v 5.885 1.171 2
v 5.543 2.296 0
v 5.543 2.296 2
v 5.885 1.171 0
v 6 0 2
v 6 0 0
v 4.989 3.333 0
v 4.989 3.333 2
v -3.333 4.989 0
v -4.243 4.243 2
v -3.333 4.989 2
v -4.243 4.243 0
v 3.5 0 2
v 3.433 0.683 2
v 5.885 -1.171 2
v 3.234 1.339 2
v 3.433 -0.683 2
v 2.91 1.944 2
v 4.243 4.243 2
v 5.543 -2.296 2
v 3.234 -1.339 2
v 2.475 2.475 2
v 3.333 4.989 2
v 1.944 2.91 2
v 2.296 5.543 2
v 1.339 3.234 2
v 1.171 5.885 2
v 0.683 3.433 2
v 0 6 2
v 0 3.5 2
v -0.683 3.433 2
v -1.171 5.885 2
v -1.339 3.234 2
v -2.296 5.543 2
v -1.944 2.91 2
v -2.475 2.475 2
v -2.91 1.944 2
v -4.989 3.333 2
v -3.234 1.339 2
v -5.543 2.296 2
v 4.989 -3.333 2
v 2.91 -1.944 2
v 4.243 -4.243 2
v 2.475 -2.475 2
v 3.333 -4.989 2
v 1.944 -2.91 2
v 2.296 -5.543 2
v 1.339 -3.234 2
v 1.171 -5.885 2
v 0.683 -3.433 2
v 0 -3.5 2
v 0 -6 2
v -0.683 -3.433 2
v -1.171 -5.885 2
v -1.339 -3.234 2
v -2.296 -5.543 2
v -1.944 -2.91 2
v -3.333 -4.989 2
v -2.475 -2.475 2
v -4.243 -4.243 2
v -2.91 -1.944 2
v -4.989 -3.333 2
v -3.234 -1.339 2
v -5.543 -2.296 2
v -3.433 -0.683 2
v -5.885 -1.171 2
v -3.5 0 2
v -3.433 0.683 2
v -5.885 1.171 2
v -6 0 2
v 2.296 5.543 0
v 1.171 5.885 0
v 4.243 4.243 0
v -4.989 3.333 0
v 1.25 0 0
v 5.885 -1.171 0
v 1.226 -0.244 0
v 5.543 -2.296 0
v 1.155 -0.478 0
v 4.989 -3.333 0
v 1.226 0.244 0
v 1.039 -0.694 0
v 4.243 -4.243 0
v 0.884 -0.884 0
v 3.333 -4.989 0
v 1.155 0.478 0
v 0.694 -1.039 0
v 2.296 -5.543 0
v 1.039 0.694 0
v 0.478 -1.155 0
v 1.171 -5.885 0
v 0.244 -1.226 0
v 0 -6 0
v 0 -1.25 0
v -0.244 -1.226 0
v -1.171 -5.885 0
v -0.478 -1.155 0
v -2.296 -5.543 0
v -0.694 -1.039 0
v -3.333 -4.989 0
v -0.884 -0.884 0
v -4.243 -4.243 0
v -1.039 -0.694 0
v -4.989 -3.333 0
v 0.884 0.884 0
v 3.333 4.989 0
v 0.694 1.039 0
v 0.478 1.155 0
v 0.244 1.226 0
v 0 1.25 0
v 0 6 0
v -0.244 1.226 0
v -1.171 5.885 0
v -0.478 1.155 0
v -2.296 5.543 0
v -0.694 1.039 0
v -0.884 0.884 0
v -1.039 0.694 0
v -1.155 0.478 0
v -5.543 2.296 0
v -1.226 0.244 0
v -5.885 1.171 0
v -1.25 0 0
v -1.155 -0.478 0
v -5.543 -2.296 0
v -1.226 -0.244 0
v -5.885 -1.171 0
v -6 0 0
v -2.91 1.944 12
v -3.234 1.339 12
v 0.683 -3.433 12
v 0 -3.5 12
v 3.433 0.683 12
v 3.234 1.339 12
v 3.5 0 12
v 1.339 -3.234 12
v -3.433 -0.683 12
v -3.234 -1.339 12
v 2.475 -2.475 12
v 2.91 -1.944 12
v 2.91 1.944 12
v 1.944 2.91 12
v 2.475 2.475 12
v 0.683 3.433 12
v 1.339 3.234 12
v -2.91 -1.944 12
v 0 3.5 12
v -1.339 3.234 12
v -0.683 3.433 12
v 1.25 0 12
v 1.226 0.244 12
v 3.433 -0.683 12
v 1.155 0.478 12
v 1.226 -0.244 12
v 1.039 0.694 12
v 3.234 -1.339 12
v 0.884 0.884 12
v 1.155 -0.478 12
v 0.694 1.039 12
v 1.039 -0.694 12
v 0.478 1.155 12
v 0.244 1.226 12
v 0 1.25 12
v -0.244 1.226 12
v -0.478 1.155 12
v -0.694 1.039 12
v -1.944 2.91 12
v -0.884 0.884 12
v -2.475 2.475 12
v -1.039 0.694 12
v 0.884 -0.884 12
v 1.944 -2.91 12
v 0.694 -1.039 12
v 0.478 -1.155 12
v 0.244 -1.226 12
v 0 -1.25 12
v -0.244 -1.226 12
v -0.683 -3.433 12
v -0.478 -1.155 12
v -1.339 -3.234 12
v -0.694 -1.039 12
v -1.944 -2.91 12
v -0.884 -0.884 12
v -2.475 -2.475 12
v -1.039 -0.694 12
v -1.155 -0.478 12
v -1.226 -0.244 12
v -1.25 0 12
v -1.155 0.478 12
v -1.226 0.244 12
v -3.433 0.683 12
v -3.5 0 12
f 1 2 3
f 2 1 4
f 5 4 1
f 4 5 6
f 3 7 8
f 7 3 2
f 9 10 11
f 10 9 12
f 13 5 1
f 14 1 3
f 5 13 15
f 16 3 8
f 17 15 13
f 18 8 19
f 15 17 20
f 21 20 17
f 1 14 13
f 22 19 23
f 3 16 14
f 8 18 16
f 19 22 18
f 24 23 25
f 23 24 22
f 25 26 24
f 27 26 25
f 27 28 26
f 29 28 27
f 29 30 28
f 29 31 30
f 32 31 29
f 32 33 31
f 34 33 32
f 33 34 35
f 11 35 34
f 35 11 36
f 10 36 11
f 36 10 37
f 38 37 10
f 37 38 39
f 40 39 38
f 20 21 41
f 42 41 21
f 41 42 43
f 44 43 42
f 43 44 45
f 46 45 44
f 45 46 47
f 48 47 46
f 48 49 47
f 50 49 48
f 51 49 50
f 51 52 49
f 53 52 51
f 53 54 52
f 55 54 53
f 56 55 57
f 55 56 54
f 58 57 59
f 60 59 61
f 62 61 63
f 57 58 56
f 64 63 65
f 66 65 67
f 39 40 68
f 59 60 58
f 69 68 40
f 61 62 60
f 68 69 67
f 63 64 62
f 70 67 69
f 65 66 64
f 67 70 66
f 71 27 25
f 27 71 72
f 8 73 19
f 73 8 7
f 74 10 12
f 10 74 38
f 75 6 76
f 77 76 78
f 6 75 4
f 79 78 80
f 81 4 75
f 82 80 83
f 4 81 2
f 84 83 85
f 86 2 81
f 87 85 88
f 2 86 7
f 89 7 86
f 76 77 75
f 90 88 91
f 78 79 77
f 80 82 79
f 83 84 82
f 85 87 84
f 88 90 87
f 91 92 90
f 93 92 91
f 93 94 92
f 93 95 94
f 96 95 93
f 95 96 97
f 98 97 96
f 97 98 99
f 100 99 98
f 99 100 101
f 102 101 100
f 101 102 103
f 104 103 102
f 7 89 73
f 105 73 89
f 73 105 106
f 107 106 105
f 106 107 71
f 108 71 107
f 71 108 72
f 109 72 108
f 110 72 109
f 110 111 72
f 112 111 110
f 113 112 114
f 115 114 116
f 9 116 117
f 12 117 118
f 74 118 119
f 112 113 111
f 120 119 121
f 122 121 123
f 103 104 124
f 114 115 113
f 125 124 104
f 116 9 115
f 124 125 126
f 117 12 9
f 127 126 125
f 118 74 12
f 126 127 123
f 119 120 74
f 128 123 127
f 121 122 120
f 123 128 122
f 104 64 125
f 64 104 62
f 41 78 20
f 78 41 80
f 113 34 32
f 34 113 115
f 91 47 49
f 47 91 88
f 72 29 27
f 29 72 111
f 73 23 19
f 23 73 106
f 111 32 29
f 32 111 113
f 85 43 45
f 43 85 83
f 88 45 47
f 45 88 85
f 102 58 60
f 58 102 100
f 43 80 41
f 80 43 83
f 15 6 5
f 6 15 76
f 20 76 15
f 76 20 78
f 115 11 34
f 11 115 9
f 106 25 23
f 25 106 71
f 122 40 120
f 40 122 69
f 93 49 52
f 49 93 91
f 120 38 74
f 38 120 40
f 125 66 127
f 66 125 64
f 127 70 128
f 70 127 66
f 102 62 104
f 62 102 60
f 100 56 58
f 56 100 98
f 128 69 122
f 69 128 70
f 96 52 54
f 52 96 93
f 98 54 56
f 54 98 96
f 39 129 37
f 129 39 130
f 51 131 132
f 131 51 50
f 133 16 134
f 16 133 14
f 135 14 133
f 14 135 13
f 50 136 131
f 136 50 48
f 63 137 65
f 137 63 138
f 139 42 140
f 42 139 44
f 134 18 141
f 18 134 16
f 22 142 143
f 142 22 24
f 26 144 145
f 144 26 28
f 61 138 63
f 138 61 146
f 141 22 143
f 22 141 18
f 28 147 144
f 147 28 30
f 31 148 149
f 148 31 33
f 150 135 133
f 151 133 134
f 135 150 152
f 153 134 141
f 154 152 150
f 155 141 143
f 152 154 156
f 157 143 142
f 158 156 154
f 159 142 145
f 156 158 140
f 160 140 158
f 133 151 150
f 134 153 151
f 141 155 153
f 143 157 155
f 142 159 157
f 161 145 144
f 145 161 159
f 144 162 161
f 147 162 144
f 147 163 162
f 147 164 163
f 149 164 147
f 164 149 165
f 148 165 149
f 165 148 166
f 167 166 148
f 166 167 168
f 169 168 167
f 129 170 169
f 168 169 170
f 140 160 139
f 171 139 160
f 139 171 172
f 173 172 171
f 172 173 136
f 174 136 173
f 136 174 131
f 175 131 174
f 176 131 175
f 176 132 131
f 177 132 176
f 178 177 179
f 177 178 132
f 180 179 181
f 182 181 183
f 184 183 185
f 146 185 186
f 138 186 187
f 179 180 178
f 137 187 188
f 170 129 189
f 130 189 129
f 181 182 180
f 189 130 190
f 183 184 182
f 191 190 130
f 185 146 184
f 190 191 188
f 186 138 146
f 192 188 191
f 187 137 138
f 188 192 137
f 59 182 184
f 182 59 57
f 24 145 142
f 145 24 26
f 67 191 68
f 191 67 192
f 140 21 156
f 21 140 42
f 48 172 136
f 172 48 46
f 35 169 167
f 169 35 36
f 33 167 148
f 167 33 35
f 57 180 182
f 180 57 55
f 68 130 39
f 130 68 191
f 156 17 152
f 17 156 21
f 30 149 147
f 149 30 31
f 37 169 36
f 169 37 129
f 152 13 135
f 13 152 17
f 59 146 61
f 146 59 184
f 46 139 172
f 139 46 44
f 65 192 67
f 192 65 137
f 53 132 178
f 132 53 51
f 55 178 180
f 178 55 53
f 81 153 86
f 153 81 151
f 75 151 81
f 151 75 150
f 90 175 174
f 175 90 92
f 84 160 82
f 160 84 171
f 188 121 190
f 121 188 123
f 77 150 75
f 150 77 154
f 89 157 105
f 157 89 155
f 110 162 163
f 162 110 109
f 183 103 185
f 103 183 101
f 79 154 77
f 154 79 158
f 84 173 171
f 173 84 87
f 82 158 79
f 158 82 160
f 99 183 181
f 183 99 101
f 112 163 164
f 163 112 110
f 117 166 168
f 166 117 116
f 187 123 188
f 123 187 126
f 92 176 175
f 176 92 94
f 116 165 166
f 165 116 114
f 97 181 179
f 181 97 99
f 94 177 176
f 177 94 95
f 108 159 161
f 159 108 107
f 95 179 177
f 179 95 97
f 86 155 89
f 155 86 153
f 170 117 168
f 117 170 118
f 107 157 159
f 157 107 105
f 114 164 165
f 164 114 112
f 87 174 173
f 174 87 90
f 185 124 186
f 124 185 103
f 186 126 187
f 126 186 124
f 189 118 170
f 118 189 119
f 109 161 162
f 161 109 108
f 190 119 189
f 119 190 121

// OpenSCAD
$fn = 32;

// ----------------------------------------------------------------------
// Micro post: flanged post, 5-20 mm class
// ----------------------------------------------------------------------

// --- parameters (mm) ---
post_d = 7;               // post diameter
post_h = 10;              // post height above the flange
flange_d = 12;            // flange diameter
flange_t = 2;             // flange thickness
bore_d = 2.5;             // through bore

total_h = post_h + flange_t;  // overall height

difference() {
  union() {
    cylinder(h = flange_t, d = flange_d);
    translate([0, 0, flange_t]) cylinder(h = post_h, d = post_d);
  }
  translate([0, 0, -1]) cylinder(h = total_h + 2, d = bore_d);
}
